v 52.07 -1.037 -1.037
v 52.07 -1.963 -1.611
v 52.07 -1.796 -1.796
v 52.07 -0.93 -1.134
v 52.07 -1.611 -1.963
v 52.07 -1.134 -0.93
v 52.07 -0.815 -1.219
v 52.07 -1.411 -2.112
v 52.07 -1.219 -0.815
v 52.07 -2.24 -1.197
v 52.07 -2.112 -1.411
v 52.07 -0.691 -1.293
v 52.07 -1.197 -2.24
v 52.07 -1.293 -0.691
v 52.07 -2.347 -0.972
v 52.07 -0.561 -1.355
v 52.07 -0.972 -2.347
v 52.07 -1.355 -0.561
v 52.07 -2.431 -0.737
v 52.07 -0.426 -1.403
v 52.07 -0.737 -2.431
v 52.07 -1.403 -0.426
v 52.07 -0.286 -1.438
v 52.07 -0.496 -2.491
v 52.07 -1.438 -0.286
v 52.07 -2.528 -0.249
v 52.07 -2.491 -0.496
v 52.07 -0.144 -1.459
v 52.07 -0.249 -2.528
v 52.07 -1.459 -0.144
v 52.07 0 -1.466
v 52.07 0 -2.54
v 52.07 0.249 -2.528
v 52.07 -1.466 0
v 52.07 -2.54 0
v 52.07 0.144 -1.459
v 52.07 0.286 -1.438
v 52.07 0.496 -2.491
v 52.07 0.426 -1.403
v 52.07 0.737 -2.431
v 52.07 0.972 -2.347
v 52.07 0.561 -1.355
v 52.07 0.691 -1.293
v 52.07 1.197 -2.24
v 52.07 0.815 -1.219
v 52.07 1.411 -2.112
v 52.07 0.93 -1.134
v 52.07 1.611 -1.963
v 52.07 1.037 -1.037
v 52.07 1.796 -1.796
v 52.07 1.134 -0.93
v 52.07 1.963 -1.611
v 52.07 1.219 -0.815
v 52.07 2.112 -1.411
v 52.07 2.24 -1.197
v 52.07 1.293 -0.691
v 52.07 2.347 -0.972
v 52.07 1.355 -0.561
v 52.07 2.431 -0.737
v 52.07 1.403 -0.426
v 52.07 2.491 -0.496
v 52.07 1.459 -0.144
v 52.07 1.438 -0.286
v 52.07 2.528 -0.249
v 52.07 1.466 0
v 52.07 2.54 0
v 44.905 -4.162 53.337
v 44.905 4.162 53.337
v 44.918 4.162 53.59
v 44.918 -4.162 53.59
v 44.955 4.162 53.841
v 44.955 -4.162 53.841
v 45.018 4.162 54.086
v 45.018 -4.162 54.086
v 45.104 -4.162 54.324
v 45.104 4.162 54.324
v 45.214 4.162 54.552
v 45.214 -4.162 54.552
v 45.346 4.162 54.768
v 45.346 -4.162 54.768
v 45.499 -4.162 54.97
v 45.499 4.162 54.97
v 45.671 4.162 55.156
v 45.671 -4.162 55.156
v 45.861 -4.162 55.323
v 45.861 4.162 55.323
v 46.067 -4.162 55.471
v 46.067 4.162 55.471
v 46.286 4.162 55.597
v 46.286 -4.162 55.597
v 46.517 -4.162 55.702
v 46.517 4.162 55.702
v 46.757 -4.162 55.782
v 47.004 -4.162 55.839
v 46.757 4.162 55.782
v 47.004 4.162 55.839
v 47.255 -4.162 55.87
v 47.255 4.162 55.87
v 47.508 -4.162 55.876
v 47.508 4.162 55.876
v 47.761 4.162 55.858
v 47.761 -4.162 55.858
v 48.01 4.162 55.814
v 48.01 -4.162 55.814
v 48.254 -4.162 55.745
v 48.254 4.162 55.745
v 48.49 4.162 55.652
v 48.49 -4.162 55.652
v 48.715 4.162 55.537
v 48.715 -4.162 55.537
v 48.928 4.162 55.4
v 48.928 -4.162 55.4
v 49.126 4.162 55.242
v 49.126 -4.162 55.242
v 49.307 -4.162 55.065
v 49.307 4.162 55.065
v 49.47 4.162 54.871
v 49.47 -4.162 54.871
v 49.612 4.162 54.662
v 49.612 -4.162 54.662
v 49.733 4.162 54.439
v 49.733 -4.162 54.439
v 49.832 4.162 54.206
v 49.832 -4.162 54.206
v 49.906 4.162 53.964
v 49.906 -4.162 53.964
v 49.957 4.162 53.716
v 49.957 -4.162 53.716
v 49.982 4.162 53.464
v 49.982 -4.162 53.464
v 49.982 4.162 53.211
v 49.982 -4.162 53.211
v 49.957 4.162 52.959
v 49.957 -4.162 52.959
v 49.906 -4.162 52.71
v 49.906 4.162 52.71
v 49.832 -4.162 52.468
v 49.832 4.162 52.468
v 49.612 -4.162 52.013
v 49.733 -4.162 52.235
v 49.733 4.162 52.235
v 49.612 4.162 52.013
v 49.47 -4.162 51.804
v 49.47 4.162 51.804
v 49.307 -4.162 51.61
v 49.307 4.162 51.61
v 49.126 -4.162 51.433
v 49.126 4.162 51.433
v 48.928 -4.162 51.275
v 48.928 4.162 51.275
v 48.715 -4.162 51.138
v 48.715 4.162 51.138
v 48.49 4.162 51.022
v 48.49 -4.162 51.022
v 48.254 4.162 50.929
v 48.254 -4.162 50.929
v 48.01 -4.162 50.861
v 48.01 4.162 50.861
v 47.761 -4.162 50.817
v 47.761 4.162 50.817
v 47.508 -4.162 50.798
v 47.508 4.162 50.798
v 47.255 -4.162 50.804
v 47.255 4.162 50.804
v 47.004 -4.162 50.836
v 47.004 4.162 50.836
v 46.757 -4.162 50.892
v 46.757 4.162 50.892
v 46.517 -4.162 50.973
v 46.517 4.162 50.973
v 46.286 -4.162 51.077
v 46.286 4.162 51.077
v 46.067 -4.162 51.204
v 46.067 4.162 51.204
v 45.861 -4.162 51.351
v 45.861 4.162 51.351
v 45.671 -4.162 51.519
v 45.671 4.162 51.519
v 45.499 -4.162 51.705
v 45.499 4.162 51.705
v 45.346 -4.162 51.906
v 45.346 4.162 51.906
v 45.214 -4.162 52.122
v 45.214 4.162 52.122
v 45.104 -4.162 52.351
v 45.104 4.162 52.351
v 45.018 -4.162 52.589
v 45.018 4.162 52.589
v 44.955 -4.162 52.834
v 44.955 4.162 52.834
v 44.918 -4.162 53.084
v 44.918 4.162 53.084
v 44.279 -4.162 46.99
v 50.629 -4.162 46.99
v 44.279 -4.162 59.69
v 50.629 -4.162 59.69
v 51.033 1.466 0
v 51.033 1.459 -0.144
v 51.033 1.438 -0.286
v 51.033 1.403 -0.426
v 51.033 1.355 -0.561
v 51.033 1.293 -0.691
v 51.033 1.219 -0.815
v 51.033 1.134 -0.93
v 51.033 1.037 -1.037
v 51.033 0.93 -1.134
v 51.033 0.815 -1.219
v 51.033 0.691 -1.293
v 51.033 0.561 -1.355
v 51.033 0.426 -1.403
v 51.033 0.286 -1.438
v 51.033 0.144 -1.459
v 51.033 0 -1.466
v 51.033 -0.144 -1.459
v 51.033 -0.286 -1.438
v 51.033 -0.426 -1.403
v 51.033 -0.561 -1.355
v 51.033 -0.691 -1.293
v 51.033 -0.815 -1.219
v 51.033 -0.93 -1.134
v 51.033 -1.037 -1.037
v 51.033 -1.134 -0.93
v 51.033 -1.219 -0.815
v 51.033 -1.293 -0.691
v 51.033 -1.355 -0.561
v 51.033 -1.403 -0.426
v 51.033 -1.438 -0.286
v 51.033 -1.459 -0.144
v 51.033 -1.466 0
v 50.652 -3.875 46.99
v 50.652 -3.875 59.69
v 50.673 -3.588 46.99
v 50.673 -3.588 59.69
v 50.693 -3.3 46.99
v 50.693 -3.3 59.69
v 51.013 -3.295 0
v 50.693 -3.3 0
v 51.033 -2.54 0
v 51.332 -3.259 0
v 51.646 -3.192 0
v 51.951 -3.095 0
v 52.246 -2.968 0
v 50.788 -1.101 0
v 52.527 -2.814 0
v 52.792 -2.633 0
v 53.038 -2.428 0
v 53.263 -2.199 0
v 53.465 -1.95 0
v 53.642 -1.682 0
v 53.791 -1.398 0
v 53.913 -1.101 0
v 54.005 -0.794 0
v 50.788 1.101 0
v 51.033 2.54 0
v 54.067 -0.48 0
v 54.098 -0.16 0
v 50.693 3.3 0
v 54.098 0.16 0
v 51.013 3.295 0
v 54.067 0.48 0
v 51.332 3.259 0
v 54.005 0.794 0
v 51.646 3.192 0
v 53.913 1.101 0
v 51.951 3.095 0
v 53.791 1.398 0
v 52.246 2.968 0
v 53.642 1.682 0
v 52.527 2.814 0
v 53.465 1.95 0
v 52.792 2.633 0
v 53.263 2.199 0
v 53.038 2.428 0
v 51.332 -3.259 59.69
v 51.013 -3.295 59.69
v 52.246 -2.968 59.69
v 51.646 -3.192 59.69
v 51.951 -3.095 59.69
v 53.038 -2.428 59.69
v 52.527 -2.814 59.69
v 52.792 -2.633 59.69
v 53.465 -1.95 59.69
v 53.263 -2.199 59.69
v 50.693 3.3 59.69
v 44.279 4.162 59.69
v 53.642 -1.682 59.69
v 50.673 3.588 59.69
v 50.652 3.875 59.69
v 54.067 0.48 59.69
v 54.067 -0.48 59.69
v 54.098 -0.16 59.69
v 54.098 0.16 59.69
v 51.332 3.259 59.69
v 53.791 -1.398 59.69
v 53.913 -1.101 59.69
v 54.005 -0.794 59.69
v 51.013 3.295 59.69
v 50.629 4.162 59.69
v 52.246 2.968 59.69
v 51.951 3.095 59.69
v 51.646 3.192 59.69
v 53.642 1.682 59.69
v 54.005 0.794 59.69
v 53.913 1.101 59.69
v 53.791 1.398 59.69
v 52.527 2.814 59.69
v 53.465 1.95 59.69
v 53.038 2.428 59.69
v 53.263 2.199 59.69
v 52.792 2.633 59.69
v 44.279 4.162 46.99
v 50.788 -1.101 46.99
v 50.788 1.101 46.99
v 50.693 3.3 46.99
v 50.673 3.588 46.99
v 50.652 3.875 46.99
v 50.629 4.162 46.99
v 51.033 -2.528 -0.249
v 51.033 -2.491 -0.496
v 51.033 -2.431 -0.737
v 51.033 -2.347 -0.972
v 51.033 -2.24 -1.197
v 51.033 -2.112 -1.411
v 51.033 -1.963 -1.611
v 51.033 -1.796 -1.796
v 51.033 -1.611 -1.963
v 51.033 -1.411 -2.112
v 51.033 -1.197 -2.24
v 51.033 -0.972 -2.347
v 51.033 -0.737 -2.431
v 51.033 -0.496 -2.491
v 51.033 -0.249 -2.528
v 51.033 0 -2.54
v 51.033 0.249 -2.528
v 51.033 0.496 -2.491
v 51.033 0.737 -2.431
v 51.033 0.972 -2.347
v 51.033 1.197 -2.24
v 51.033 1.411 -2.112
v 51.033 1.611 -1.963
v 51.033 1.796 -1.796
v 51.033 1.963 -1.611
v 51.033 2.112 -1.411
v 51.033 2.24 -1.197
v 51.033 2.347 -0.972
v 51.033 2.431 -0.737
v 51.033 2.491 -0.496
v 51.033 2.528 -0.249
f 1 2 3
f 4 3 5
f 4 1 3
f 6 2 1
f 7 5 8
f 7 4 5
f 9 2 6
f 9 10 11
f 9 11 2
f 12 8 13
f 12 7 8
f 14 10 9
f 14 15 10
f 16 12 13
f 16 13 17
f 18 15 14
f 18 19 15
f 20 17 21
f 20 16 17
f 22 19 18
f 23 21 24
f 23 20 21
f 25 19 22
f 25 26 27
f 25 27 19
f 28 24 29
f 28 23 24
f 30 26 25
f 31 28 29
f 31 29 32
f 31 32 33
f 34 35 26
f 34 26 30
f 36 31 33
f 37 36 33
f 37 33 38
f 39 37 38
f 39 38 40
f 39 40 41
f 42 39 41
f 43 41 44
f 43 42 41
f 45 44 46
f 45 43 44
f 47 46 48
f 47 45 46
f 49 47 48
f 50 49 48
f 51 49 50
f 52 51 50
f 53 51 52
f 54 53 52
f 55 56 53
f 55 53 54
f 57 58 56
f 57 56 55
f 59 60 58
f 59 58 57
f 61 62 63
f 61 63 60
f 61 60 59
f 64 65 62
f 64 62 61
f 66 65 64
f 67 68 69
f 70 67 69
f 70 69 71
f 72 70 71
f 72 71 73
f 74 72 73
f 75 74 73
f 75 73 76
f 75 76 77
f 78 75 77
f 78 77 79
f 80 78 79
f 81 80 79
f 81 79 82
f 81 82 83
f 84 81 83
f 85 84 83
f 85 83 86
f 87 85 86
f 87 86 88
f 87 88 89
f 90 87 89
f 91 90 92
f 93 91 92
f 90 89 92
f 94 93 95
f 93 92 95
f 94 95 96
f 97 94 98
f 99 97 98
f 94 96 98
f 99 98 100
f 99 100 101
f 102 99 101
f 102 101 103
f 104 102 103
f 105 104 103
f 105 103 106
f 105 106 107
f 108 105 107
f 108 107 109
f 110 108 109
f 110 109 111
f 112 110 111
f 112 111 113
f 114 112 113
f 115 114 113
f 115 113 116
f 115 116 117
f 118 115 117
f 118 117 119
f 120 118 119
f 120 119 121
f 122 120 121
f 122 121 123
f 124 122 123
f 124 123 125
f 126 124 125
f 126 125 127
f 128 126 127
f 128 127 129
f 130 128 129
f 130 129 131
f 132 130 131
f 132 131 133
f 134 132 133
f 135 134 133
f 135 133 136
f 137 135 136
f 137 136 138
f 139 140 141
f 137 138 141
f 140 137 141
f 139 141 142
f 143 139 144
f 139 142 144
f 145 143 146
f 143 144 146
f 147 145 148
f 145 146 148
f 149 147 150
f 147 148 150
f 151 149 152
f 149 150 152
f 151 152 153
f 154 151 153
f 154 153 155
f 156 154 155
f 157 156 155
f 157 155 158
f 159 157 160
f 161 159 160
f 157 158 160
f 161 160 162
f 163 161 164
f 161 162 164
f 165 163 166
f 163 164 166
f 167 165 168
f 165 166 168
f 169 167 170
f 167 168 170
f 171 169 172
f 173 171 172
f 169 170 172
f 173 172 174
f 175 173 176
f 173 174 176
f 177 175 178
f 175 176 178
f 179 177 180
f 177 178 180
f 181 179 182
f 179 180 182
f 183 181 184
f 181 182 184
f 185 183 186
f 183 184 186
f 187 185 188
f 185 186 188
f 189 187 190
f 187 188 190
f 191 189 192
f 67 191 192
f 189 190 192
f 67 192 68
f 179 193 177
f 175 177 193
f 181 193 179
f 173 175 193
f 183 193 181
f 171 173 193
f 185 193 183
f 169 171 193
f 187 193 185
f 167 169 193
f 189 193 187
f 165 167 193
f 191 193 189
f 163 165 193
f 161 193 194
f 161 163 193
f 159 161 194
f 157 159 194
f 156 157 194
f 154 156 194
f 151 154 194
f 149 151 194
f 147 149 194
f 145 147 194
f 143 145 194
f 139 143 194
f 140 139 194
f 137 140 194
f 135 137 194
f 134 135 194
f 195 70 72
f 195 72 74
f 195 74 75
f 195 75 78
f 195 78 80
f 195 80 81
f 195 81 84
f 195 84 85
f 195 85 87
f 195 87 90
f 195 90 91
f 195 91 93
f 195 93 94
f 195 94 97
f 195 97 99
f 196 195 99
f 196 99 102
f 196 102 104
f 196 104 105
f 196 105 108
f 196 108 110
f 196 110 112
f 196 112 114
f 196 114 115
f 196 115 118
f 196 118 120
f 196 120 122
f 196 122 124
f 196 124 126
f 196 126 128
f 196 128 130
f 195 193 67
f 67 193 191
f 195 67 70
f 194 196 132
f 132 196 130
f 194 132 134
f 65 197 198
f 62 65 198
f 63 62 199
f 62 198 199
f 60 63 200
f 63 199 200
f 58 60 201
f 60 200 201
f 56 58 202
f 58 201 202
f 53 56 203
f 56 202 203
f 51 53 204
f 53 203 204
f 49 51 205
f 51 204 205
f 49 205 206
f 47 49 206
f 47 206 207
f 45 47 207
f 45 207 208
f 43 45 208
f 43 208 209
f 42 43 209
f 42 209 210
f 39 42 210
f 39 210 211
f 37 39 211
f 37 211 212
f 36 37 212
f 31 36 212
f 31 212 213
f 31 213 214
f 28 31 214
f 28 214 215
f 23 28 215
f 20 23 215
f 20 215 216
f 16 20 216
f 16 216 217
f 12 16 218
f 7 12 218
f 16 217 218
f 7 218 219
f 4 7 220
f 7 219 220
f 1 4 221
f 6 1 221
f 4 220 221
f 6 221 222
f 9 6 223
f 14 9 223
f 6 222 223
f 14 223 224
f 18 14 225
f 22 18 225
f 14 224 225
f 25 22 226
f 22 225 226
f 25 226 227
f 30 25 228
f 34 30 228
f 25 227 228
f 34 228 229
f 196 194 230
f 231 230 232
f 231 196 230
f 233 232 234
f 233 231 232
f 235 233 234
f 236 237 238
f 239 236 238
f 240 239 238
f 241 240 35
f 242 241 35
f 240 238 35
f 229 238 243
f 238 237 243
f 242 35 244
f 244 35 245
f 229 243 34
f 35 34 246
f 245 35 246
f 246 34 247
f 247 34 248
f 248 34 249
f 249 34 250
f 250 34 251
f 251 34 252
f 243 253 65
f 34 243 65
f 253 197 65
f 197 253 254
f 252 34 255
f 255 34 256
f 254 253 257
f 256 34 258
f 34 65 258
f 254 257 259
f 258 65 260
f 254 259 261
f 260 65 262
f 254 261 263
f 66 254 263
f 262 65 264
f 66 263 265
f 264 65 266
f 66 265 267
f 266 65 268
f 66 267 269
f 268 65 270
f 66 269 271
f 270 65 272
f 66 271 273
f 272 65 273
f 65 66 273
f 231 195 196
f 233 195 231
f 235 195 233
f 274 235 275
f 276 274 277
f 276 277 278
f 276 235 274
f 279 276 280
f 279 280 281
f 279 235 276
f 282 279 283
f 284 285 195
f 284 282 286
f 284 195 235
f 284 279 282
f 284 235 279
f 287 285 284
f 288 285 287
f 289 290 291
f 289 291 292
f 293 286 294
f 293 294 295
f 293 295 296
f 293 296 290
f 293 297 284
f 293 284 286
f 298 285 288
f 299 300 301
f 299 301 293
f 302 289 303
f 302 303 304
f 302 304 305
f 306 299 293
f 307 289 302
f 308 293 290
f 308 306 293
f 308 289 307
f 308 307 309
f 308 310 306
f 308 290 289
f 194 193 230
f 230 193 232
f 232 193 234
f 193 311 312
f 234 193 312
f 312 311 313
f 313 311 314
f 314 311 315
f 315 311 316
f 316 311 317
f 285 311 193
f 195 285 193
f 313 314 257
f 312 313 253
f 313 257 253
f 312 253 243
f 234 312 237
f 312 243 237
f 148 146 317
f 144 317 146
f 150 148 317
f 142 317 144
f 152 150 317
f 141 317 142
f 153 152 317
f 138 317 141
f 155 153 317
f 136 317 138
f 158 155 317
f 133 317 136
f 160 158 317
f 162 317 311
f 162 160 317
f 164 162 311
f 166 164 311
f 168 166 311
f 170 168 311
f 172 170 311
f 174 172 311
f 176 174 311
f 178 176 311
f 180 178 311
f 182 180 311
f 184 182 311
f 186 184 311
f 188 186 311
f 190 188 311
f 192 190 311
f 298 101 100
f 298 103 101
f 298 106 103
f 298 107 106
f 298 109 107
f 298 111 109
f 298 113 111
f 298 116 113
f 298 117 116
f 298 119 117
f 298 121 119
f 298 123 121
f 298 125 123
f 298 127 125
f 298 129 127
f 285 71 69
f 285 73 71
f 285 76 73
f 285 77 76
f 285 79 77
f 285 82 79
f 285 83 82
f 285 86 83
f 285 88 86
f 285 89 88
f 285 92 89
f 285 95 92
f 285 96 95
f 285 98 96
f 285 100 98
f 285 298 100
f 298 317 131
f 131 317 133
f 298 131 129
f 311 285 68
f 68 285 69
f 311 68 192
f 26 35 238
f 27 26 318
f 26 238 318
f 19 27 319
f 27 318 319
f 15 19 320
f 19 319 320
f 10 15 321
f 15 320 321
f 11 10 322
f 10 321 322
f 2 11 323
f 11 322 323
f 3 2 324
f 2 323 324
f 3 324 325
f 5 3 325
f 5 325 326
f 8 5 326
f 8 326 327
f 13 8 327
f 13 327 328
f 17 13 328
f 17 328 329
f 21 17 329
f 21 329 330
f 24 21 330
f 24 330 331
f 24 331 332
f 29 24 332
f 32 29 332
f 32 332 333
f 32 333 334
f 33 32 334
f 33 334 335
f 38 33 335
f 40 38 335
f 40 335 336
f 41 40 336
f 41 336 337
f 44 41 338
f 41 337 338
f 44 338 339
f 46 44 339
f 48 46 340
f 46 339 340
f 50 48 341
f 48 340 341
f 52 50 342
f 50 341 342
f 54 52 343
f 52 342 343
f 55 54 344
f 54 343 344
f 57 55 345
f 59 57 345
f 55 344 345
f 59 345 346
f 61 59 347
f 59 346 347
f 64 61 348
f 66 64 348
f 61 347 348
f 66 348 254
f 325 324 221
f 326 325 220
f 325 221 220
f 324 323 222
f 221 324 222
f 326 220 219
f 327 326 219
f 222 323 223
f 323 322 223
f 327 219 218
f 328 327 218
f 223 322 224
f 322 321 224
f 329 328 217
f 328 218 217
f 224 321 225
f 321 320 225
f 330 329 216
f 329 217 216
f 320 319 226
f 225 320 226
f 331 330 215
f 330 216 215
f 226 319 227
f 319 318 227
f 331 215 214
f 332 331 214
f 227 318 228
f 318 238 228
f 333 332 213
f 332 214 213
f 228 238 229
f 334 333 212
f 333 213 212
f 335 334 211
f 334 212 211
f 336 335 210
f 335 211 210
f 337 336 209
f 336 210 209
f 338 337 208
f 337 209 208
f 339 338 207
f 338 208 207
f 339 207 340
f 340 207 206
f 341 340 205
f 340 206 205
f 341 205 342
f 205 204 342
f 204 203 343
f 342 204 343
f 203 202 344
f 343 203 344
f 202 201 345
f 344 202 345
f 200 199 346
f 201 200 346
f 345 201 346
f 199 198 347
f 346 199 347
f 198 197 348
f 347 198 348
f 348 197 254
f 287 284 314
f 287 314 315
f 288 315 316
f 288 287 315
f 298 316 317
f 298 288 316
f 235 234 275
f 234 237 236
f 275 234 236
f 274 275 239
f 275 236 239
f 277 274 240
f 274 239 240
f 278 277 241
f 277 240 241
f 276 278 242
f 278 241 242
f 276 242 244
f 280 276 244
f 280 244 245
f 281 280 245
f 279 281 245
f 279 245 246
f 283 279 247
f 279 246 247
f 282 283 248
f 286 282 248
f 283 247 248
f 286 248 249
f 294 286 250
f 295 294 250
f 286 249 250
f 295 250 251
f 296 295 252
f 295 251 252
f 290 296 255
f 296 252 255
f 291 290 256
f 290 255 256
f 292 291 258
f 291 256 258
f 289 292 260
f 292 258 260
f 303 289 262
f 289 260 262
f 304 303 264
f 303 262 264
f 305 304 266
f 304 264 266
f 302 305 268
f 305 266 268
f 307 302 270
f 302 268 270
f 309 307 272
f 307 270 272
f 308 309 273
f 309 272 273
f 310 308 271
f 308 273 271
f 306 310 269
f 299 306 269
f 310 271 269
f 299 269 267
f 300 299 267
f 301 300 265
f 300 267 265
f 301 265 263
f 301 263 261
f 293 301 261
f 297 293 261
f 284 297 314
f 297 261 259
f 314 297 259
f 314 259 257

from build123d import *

# Parameters (mm, degrees)
F1_DEPTH  = 59.69
F3_DEPTH  = 12.7
F5_R      = 2.54
F6_DEPTH  = 25.4
F8_DEPTH  = 52.07
F9_W      = 75.692
F9_H      = 5.588
F10_DEPTH = 25.4


with BuildPart() as f1:
    # F0 (on Top) → F1 (new body)
    with BuildSketch(Plane.XY):
        with BuildLine():
            ThreePointArc((50.692685, 3.300256), (50.8, 0), (50.692685, -3.300256))
            ThreePointArc((50.692685, -3.300256), (54.102, 0), (50.692685, 3.300256))
        make_face()
    extrude(amount=F1_DEPTH)

    # F2 (on face) → F3 (join)
    with BuildSketch(Plane.XY.offset(59.69)):
        with BuildLine():
            Line((44.27921, -4.162097), (50.62921, -4.162097))
            ThreePointArc((50.62921, -4.162097), (50.8, 0), (50.62921, 4.162097))
            Line((50.62921, 4.162097), (44.27921, 4.162097))
            Line((44.27921, 4.162097), (44.27921, -4.162097))
        make_face()
    extrude(amount=-F3_DEPTH)

    # F5 (on face) → F6 (cut)
    with BuildSketch(Plane(origin=(0, 4.162097, 0), x_dir=(-1, 0, 0), z_dir=(0, 1, 0))):
        with Locations((-47.445018, 53.337224)):
            Circle(F5_R)
    extrude(amount=-F6_DEPTH, mode=Mode.SUBTRACT)

    # F7 (on Right) → F8 (join)
    with BuildSketch(Plane.YZ):
        with BuildLine():
            ThreePointArc((1.46637, 0), (0, -1.46637), (-1.46637, 0))
            Line((-1.46637, 0), (-2.54, 0))
            ThreePointArc((-2.54, 0), (0, -2.54), (2.54, 0))
            Line((2.54, 0), (1.46637, 0))
        make_face()
    extrude(amount=F8_DEPTH)

    # F9 (on Top) → F10 (cut)
    with BuildSketch(Plane.XY):
        with Locations((13.186903, 0.036883)):
            Rectangle(F9_W, F9_H)
    extrude(amount=-F10_DEPTH, mode=Mode.SUBTRACT)


solid = f1.part
